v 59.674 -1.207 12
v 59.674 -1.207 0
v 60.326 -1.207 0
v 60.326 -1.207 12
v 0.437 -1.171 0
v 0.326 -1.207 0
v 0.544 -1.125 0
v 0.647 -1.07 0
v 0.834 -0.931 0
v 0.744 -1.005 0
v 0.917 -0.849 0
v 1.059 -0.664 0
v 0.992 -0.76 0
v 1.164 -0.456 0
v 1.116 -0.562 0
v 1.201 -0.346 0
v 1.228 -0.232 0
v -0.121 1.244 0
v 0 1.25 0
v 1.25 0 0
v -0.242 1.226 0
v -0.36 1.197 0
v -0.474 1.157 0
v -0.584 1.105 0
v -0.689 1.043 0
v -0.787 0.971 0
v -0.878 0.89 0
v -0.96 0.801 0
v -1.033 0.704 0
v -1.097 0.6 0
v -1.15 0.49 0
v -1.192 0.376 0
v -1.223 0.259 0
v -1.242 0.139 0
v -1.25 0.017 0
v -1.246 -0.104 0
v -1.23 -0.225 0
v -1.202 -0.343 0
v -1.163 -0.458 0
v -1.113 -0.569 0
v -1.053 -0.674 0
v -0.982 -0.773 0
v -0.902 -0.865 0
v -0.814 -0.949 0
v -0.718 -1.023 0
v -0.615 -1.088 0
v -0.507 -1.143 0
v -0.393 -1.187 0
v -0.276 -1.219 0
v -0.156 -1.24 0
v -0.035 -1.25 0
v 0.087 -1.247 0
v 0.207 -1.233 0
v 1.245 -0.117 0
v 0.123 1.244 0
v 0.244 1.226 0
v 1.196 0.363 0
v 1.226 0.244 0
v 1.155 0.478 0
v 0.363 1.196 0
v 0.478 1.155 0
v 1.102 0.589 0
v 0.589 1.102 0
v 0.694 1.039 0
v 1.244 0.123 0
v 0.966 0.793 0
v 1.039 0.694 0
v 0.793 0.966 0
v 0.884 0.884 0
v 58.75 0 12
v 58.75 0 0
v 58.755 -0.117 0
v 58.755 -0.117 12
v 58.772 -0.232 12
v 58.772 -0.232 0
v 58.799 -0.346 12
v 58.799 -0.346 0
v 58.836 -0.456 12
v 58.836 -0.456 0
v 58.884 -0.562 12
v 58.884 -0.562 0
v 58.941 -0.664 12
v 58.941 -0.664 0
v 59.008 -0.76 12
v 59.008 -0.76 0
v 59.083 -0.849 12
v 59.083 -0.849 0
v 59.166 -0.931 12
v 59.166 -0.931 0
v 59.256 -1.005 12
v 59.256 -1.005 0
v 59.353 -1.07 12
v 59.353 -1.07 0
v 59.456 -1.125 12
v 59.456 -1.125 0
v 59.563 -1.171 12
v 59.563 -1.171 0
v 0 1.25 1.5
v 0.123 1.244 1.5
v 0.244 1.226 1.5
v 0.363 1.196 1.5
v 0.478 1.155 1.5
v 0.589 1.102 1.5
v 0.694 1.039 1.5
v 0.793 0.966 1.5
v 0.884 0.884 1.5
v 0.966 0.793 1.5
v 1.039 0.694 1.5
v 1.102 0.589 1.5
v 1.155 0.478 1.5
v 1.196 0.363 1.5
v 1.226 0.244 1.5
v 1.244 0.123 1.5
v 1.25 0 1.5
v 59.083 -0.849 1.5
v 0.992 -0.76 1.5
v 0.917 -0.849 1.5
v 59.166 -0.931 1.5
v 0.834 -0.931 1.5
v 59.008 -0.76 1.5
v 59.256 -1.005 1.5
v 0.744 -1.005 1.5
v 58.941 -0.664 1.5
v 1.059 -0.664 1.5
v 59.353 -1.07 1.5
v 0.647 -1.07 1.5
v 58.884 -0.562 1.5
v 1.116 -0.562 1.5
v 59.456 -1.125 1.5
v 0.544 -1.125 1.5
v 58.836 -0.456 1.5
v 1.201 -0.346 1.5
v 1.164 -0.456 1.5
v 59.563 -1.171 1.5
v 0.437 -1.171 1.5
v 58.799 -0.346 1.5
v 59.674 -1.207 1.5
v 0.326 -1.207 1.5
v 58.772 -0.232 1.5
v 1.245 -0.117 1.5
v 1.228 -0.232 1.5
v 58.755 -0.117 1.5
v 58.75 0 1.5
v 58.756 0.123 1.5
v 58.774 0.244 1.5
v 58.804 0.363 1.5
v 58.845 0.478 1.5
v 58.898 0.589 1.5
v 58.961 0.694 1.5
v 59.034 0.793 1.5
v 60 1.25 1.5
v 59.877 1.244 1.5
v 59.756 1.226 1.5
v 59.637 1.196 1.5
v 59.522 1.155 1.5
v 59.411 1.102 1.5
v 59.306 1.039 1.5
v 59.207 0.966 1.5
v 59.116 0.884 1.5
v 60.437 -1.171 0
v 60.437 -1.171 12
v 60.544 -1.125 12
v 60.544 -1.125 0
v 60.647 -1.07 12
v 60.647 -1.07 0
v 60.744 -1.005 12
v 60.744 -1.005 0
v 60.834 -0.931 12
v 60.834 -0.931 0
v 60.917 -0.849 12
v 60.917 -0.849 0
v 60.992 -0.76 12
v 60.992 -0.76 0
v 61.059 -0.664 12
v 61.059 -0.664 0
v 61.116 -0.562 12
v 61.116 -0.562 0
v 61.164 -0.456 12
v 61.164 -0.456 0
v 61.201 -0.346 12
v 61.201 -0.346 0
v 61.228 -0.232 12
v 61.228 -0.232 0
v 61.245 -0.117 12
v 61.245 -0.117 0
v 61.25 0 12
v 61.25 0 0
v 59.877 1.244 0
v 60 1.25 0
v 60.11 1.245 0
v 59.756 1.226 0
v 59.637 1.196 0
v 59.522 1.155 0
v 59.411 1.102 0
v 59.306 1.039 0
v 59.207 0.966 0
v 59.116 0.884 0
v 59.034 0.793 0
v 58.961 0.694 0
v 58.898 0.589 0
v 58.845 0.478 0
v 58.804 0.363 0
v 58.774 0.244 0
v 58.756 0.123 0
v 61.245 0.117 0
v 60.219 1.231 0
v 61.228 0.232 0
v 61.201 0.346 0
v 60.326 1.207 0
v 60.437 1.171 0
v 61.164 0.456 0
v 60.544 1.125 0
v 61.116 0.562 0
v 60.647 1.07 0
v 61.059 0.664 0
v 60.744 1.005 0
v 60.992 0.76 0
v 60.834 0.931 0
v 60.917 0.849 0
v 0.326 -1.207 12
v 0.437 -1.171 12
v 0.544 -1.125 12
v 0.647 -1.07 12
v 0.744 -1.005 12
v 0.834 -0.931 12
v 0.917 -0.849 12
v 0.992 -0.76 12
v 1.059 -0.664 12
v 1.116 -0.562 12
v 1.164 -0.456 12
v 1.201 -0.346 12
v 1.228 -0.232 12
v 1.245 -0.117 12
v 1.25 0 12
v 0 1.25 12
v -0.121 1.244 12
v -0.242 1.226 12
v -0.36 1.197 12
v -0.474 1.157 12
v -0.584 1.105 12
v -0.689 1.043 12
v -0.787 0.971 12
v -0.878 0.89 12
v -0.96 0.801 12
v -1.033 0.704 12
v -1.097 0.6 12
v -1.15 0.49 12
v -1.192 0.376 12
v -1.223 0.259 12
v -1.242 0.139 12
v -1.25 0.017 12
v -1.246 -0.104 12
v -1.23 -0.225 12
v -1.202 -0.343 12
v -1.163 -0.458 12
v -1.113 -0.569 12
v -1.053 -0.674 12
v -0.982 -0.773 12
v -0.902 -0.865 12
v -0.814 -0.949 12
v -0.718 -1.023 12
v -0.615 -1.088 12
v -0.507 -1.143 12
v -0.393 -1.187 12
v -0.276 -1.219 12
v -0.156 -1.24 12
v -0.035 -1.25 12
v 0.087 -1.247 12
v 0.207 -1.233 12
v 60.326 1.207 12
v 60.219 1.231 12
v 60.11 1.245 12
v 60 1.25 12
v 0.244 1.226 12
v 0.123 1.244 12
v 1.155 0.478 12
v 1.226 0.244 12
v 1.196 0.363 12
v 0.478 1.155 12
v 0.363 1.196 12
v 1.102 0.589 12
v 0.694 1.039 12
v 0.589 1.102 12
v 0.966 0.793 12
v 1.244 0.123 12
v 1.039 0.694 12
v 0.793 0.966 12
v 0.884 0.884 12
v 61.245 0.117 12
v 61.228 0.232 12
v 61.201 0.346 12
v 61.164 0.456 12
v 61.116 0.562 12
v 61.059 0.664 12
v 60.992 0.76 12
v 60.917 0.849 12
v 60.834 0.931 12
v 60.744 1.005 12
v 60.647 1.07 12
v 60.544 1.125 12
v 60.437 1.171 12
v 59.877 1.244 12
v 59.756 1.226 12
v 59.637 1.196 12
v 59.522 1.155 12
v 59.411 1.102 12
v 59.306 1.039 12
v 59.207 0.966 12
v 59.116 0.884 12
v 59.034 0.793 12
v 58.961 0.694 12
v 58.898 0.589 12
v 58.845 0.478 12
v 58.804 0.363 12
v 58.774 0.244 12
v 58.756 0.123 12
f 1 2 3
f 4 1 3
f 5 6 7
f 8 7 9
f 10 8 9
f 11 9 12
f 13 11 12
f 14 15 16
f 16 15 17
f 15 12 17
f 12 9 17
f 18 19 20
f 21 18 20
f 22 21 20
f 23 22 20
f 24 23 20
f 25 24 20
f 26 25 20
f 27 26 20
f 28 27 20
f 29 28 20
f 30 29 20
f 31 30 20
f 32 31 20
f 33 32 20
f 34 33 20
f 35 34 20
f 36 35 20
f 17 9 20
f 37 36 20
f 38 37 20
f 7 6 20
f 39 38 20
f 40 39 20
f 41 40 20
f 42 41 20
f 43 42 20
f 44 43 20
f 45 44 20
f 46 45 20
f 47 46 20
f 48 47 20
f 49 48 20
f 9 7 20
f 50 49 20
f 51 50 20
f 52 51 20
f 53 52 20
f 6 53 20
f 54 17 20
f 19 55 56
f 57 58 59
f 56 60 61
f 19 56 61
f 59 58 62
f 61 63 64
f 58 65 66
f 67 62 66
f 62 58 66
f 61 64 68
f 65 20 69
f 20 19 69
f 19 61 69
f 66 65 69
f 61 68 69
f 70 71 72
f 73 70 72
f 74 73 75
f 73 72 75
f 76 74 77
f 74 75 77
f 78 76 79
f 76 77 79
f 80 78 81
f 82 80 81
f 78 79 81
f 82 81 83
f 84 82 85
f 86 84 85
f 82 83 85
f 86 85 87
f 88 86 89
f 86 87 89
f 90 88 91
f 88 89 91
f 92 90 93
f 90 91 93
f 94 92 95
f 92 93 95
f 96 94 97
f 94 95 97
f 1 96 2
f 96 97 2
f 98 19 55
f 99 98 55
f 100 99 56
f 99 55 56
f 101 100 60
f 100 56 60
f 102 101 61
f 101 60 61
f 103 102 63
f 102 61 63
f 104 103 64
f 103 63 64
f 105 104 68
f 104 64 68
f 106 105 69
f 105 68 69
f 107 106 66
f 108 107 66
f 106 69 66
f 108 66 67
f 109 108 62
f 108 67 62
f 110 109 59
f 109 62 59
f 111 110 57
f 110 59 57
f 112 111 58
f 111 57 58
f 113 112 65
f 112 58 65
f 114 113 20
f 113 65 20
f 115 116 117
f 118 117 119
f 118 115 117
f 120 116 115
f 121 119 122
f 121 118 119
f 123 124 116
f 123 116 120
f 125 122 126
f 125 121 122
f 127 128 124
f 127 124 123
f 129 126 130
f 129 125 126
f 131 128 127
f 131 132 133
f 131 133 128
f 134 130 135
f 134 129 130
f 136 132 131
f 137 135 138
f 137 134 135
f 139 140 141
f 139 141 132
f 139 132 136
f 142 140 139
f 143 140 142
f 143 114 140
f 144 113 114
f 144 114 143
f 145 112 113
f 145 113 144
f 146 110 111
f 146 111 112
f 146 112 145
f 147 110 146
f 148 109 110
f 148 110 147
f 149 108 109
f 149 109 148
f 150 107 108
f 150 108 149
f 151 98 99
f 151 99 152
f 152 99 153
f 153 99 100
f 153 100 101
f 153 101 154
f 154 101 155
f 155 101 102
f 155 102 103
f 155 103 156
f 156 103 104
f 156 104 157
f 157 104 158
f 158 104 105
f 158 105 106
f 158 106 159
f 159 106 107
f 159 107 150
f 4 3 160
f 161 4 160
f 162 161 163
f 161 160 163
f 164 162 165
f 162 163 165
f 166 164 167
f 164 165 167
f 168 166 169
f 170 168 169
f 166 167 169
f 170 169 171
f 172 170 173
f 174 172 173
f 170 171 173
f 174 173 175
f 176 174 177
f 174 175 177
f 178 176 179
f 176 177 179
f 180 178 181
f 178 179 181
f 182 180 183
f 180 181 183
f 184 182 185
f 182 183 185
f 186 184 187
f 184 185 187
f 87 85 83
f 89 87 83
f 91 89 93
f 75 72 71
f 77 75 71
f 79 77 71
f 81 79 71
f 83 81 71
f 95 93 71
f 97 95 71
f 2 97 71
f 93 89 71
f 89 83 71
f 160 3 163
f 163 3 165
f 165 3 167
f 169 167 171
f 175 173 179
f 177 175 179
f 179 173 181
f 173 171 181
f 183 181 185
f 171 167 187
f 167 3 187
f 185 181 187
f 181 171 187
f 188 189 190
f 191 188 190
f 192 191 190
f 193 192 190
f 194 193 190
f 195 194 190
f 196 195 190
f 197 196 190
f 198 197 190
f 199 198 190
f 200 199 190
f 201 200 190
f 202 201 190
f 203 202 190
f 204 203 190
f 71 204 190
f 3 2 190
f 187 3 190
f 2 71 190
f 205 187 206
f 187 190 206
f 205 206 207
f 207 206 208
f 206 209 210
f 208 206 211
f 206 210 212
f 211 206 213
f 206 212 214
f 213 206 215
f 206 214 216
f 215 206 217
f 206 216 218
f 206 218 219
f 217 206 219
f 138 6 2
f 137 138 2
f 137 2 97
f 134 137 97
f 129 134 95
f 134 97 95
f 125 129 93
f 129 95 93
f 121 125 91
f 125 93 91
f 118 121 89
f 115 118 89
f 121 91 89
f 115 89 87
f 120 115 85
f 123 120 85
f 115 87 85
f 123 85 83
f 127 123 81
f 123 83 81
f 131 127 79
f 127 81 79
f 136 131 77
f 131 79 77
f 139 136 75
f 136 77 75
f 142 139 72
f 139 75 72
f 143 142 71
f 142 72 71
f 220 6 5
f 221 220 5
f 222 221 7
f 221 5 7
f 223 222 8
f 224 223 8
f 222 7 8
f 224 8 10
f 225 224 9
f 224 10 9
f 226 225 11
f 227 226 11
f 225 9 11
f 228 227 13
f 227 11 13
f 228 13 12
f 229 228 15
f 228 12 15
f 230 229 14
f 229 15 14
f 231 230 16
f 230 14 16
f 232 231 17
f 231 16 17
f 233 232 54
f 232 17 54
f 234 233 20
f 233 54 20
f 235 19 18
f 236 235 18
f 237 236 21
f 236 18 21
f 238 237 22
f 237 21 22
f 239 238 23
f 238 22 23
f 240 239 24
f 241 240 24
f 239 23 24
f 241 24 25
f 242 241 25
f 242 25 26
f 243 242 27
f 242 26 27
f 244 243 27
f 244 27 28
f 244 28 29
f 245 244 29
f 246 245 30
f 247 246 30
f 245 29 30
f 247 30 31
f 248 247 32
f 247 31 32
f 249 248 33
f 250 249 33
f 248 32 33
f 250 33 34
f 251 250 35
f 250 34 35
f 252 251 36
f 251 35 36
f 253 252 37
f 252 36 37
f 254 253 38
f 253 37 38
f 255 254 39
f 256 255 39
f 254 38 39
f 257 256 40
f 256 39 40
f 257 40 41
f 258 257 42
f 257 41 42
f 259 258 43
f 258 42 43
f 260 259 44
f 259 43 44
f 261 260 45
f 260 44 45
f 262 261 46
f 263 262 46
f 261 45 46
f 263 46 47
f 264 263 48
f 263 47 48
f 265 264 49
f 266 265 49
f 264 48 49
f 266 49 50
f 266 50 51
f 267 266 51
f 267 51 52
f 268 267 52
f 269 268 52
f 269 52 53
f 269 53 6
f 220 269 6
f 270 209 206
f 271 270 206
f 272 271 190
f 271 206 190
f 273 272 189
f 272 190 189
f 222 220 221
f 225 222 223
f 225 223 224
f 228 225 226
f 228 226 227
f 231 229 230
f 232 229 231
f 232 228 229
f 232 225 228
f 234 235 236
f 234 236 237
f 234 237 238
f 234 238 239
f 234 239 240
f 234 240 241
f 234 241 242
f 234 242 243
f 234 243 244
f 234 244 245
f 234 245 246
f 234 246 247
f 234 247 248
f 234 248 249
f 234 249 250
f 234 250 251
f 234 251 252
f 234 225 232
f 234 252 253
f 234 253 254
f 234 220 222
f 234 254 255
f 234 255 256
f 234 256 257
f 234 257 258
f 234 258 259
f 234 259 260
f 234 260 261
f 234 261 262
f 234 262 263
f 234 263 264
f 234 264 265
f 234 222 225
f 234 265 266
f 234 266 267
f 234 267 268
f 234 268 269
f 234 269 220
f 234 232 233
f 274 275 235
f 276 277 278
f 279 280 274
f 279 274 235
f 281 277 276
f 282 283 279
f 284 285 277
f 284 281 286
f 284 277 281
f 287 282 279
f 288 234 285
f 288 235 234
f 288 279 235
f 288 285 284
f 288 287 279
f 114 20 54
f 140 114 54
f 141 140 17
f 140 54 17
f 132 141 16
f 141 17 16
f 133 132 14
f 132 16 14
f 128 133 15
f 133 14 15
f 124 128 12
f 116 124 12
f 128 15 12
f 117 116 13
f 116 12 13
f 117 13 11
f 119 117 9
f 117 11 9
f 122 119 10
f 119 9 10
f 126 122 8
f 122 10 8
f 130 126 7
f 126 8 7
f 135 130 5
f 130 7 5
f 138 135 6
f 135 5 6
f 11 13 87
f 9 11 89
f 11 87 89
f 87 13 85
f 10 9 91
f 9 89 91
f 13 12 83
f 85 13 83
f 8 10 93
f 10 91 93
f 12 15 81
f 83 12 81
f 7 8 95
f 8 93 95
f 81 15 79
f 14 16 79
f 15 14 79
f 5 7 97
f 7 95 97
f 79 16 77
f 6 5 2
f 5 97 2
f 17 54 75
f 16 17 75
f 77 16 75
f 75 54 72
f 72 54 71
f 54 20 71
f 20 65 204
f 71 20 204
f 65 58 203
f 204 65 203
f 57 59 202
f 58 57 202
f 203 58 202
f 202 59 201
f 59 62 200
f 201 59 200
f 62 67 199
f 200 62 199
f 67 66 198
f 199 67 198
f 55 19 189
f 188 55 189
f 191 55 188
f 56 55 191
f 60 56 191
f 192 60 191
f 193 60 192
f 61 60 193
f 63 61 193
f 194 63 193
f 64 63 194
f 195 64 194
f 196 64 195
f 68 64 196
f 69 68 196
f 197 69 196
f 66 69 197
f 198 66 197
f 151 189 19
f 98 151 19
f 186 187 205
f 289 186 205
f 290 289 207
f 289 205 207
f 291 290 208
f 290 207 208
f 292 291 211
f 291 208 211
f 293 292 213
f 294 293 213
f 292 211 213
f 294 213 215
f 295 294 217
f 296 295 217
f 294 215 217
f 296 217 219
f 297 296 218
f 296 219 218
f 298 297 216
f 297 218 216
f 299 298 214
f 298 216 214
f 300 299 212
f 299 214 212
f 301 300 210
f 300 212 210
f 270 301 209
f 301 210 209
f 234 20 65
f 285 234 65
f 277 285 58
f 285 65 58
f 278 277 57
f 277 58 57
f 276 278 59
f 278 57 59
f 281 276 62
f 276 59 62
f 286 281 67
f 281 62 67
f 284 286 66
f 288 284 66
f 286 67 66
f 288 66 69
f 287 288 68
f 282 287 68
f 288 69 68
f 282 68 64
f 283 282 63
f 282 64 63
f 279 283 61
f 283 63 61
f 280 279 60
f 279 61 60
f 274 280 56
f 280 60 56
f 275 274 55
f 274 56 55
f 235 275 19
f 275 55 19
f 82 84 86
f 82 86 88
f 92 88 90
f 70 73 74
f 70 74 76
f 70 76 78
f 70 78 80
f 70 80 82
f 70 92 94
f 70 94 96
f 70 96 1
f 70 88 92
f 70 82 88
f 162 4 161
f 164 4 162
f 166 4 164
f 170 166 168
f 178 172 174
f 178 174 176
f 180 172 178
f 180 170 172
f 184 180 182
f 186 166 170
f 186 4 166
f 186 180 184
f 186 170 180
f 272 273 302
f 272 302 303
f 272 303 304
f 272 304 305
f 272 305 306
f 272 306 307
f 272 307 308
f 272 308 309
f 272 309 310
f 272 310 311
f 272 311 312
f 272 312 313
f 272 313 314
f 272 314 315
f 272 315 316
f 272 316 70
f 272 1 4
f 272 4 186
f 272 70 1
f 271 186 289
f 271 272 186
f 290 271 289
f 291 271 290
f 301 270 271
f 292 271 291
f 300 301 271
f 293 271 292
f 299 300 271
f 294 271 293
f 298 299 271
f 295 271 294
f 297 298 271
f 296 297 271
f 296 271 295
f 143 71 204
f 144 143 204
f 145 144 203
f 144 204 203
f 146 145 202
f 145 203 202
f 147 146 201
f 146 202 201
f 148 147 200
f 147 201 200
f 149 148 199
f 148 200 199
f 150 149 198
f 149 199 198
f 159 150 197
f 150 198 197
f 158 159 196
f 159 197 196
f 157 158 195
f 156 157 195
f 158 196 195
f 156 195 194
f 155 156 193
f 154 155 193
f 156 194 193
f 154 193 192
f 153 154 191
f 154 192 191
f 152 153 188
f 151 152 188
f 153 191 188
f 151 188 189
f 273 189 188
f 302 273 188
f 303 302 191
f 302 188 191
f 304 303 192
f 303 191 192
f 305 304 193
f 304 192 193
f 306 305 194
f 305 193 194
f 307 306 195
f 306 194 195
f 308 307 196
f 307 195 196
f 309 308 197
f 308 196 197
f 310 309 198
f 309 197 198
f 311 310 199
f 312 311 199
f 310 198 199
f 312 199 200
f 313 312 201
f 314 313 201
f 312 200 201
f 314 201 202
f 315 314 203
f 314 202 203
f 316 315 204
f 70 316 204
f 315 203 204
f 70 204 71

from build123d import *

# Parameters (mm, degrees)
F1_DEPTH = 12
F2_DEPTH = 1.5


with BuildPart() as f1:
    # F0 (on Top) → F1 (new body)
    with BuildSketch(Plane.XY):
        with BuildLine():
            Line((0, 0), (0, 1.25))
            ThreePointArc((0, 1.25), (-1.2391339401, -0.1644599598), (0.3260606688, -1.2067246746))
            Line((0.3260606688, -1.2067246746), (0, -1.2067246746))
            Line((0, -1.2067246746), (0, 0))
        make_face()
        with BuildLine():
            ThreePointArc((0.3260606688, -1.2067246746), (0.9924907647, -0.7599092591), (1.25, 0))
            Line((1.25, 0), (0, 0))
            Line((0, 0), (0, -1.2067246746))
            Line((0, -1.2067246746), (0.3260606688, -1.2067246746))
        make_face()
        with BuildLine():
            Line((0, 0), (1.25, 0))
            ThreePointArc((1.25, 0), (0.8838834765, 0.8838834765), (0, 1.25))
            Line((0, 1.25), (0, 0))
        make_face()
    extrude(amount=F1_DEPTH)


with BuildPart() as f1b:
    # F0 (on Top) → F1, piece 2 (new body)
    with BuildSketch(Plane.XY):
        with BuildLine():
            ThreePointArc((61.25, 0), (60.9924907647, 0.7599092591), (60.3260606688, 1.2067246746))
            Line((60.3260606688, 1.2067246746), (60.3260606688, -1.2067246746))
            ThreePointArc((60.3260606688, -1.2067246746), (60.9924907647, -0.7599092591), (61.25, 0))
        make_face()
        with BuildLine():
            ThreePointArc((60, 1.25), (59.1161165235, 0.8838834765), (58.75, 0))
            ThreePointArc((58.75, 0), (59.0075092353, -0.7599092591), (59.6739393312, -1.2067246746))
            Line((59.6739393312, -1.2067246746), (60.3260606688, -1.2067246746))
            Line((60.3260606688, -1.2067246746), (60.3260606688, 1.2067246746))
            ThreePointArc((60.3260606688, 1.2067246746), (60.1644599598, 1.2391339401), (60, 1.25))
        make_face()
    extrude(amount=F1_DEPTH)


with BuildPart() as f2:
    # F0 (on Top) → F2 (new body)
    with BuildSketch(Plane.XY):
        with BuildLine():
            ThreePointArc((0, 1.25), (0.8838834765, 0.8838834765), (1.25, 0))
            Line((1.25, 0), (58.75, 0))
            ThreePointArc((58.75, 0), (59.1161165235, 0.8838834765), (60, 1.25))
            Line((60, 1.25), (0, 1.25))
        make_face()
        with BuildLine():
            Line((58.75, 0), (1.25, 0))
            ThreePointArc((1.25, 0), (0.9924907647, -0.7599092591), (0.3260606688, -1.2067246746))
            Line((0.3260606688, -1.2067246746), (59.6739393312, -1.2067246746))
            ThreePointArc((59.6739393312, -1.2067246746), (59.0075092353, -0.7599092591), (58.75, 0))
        make_face()
    extrude(amount=F2_DEPTH)


solid = Compound([f1.part, f1b.part, f2.part])
